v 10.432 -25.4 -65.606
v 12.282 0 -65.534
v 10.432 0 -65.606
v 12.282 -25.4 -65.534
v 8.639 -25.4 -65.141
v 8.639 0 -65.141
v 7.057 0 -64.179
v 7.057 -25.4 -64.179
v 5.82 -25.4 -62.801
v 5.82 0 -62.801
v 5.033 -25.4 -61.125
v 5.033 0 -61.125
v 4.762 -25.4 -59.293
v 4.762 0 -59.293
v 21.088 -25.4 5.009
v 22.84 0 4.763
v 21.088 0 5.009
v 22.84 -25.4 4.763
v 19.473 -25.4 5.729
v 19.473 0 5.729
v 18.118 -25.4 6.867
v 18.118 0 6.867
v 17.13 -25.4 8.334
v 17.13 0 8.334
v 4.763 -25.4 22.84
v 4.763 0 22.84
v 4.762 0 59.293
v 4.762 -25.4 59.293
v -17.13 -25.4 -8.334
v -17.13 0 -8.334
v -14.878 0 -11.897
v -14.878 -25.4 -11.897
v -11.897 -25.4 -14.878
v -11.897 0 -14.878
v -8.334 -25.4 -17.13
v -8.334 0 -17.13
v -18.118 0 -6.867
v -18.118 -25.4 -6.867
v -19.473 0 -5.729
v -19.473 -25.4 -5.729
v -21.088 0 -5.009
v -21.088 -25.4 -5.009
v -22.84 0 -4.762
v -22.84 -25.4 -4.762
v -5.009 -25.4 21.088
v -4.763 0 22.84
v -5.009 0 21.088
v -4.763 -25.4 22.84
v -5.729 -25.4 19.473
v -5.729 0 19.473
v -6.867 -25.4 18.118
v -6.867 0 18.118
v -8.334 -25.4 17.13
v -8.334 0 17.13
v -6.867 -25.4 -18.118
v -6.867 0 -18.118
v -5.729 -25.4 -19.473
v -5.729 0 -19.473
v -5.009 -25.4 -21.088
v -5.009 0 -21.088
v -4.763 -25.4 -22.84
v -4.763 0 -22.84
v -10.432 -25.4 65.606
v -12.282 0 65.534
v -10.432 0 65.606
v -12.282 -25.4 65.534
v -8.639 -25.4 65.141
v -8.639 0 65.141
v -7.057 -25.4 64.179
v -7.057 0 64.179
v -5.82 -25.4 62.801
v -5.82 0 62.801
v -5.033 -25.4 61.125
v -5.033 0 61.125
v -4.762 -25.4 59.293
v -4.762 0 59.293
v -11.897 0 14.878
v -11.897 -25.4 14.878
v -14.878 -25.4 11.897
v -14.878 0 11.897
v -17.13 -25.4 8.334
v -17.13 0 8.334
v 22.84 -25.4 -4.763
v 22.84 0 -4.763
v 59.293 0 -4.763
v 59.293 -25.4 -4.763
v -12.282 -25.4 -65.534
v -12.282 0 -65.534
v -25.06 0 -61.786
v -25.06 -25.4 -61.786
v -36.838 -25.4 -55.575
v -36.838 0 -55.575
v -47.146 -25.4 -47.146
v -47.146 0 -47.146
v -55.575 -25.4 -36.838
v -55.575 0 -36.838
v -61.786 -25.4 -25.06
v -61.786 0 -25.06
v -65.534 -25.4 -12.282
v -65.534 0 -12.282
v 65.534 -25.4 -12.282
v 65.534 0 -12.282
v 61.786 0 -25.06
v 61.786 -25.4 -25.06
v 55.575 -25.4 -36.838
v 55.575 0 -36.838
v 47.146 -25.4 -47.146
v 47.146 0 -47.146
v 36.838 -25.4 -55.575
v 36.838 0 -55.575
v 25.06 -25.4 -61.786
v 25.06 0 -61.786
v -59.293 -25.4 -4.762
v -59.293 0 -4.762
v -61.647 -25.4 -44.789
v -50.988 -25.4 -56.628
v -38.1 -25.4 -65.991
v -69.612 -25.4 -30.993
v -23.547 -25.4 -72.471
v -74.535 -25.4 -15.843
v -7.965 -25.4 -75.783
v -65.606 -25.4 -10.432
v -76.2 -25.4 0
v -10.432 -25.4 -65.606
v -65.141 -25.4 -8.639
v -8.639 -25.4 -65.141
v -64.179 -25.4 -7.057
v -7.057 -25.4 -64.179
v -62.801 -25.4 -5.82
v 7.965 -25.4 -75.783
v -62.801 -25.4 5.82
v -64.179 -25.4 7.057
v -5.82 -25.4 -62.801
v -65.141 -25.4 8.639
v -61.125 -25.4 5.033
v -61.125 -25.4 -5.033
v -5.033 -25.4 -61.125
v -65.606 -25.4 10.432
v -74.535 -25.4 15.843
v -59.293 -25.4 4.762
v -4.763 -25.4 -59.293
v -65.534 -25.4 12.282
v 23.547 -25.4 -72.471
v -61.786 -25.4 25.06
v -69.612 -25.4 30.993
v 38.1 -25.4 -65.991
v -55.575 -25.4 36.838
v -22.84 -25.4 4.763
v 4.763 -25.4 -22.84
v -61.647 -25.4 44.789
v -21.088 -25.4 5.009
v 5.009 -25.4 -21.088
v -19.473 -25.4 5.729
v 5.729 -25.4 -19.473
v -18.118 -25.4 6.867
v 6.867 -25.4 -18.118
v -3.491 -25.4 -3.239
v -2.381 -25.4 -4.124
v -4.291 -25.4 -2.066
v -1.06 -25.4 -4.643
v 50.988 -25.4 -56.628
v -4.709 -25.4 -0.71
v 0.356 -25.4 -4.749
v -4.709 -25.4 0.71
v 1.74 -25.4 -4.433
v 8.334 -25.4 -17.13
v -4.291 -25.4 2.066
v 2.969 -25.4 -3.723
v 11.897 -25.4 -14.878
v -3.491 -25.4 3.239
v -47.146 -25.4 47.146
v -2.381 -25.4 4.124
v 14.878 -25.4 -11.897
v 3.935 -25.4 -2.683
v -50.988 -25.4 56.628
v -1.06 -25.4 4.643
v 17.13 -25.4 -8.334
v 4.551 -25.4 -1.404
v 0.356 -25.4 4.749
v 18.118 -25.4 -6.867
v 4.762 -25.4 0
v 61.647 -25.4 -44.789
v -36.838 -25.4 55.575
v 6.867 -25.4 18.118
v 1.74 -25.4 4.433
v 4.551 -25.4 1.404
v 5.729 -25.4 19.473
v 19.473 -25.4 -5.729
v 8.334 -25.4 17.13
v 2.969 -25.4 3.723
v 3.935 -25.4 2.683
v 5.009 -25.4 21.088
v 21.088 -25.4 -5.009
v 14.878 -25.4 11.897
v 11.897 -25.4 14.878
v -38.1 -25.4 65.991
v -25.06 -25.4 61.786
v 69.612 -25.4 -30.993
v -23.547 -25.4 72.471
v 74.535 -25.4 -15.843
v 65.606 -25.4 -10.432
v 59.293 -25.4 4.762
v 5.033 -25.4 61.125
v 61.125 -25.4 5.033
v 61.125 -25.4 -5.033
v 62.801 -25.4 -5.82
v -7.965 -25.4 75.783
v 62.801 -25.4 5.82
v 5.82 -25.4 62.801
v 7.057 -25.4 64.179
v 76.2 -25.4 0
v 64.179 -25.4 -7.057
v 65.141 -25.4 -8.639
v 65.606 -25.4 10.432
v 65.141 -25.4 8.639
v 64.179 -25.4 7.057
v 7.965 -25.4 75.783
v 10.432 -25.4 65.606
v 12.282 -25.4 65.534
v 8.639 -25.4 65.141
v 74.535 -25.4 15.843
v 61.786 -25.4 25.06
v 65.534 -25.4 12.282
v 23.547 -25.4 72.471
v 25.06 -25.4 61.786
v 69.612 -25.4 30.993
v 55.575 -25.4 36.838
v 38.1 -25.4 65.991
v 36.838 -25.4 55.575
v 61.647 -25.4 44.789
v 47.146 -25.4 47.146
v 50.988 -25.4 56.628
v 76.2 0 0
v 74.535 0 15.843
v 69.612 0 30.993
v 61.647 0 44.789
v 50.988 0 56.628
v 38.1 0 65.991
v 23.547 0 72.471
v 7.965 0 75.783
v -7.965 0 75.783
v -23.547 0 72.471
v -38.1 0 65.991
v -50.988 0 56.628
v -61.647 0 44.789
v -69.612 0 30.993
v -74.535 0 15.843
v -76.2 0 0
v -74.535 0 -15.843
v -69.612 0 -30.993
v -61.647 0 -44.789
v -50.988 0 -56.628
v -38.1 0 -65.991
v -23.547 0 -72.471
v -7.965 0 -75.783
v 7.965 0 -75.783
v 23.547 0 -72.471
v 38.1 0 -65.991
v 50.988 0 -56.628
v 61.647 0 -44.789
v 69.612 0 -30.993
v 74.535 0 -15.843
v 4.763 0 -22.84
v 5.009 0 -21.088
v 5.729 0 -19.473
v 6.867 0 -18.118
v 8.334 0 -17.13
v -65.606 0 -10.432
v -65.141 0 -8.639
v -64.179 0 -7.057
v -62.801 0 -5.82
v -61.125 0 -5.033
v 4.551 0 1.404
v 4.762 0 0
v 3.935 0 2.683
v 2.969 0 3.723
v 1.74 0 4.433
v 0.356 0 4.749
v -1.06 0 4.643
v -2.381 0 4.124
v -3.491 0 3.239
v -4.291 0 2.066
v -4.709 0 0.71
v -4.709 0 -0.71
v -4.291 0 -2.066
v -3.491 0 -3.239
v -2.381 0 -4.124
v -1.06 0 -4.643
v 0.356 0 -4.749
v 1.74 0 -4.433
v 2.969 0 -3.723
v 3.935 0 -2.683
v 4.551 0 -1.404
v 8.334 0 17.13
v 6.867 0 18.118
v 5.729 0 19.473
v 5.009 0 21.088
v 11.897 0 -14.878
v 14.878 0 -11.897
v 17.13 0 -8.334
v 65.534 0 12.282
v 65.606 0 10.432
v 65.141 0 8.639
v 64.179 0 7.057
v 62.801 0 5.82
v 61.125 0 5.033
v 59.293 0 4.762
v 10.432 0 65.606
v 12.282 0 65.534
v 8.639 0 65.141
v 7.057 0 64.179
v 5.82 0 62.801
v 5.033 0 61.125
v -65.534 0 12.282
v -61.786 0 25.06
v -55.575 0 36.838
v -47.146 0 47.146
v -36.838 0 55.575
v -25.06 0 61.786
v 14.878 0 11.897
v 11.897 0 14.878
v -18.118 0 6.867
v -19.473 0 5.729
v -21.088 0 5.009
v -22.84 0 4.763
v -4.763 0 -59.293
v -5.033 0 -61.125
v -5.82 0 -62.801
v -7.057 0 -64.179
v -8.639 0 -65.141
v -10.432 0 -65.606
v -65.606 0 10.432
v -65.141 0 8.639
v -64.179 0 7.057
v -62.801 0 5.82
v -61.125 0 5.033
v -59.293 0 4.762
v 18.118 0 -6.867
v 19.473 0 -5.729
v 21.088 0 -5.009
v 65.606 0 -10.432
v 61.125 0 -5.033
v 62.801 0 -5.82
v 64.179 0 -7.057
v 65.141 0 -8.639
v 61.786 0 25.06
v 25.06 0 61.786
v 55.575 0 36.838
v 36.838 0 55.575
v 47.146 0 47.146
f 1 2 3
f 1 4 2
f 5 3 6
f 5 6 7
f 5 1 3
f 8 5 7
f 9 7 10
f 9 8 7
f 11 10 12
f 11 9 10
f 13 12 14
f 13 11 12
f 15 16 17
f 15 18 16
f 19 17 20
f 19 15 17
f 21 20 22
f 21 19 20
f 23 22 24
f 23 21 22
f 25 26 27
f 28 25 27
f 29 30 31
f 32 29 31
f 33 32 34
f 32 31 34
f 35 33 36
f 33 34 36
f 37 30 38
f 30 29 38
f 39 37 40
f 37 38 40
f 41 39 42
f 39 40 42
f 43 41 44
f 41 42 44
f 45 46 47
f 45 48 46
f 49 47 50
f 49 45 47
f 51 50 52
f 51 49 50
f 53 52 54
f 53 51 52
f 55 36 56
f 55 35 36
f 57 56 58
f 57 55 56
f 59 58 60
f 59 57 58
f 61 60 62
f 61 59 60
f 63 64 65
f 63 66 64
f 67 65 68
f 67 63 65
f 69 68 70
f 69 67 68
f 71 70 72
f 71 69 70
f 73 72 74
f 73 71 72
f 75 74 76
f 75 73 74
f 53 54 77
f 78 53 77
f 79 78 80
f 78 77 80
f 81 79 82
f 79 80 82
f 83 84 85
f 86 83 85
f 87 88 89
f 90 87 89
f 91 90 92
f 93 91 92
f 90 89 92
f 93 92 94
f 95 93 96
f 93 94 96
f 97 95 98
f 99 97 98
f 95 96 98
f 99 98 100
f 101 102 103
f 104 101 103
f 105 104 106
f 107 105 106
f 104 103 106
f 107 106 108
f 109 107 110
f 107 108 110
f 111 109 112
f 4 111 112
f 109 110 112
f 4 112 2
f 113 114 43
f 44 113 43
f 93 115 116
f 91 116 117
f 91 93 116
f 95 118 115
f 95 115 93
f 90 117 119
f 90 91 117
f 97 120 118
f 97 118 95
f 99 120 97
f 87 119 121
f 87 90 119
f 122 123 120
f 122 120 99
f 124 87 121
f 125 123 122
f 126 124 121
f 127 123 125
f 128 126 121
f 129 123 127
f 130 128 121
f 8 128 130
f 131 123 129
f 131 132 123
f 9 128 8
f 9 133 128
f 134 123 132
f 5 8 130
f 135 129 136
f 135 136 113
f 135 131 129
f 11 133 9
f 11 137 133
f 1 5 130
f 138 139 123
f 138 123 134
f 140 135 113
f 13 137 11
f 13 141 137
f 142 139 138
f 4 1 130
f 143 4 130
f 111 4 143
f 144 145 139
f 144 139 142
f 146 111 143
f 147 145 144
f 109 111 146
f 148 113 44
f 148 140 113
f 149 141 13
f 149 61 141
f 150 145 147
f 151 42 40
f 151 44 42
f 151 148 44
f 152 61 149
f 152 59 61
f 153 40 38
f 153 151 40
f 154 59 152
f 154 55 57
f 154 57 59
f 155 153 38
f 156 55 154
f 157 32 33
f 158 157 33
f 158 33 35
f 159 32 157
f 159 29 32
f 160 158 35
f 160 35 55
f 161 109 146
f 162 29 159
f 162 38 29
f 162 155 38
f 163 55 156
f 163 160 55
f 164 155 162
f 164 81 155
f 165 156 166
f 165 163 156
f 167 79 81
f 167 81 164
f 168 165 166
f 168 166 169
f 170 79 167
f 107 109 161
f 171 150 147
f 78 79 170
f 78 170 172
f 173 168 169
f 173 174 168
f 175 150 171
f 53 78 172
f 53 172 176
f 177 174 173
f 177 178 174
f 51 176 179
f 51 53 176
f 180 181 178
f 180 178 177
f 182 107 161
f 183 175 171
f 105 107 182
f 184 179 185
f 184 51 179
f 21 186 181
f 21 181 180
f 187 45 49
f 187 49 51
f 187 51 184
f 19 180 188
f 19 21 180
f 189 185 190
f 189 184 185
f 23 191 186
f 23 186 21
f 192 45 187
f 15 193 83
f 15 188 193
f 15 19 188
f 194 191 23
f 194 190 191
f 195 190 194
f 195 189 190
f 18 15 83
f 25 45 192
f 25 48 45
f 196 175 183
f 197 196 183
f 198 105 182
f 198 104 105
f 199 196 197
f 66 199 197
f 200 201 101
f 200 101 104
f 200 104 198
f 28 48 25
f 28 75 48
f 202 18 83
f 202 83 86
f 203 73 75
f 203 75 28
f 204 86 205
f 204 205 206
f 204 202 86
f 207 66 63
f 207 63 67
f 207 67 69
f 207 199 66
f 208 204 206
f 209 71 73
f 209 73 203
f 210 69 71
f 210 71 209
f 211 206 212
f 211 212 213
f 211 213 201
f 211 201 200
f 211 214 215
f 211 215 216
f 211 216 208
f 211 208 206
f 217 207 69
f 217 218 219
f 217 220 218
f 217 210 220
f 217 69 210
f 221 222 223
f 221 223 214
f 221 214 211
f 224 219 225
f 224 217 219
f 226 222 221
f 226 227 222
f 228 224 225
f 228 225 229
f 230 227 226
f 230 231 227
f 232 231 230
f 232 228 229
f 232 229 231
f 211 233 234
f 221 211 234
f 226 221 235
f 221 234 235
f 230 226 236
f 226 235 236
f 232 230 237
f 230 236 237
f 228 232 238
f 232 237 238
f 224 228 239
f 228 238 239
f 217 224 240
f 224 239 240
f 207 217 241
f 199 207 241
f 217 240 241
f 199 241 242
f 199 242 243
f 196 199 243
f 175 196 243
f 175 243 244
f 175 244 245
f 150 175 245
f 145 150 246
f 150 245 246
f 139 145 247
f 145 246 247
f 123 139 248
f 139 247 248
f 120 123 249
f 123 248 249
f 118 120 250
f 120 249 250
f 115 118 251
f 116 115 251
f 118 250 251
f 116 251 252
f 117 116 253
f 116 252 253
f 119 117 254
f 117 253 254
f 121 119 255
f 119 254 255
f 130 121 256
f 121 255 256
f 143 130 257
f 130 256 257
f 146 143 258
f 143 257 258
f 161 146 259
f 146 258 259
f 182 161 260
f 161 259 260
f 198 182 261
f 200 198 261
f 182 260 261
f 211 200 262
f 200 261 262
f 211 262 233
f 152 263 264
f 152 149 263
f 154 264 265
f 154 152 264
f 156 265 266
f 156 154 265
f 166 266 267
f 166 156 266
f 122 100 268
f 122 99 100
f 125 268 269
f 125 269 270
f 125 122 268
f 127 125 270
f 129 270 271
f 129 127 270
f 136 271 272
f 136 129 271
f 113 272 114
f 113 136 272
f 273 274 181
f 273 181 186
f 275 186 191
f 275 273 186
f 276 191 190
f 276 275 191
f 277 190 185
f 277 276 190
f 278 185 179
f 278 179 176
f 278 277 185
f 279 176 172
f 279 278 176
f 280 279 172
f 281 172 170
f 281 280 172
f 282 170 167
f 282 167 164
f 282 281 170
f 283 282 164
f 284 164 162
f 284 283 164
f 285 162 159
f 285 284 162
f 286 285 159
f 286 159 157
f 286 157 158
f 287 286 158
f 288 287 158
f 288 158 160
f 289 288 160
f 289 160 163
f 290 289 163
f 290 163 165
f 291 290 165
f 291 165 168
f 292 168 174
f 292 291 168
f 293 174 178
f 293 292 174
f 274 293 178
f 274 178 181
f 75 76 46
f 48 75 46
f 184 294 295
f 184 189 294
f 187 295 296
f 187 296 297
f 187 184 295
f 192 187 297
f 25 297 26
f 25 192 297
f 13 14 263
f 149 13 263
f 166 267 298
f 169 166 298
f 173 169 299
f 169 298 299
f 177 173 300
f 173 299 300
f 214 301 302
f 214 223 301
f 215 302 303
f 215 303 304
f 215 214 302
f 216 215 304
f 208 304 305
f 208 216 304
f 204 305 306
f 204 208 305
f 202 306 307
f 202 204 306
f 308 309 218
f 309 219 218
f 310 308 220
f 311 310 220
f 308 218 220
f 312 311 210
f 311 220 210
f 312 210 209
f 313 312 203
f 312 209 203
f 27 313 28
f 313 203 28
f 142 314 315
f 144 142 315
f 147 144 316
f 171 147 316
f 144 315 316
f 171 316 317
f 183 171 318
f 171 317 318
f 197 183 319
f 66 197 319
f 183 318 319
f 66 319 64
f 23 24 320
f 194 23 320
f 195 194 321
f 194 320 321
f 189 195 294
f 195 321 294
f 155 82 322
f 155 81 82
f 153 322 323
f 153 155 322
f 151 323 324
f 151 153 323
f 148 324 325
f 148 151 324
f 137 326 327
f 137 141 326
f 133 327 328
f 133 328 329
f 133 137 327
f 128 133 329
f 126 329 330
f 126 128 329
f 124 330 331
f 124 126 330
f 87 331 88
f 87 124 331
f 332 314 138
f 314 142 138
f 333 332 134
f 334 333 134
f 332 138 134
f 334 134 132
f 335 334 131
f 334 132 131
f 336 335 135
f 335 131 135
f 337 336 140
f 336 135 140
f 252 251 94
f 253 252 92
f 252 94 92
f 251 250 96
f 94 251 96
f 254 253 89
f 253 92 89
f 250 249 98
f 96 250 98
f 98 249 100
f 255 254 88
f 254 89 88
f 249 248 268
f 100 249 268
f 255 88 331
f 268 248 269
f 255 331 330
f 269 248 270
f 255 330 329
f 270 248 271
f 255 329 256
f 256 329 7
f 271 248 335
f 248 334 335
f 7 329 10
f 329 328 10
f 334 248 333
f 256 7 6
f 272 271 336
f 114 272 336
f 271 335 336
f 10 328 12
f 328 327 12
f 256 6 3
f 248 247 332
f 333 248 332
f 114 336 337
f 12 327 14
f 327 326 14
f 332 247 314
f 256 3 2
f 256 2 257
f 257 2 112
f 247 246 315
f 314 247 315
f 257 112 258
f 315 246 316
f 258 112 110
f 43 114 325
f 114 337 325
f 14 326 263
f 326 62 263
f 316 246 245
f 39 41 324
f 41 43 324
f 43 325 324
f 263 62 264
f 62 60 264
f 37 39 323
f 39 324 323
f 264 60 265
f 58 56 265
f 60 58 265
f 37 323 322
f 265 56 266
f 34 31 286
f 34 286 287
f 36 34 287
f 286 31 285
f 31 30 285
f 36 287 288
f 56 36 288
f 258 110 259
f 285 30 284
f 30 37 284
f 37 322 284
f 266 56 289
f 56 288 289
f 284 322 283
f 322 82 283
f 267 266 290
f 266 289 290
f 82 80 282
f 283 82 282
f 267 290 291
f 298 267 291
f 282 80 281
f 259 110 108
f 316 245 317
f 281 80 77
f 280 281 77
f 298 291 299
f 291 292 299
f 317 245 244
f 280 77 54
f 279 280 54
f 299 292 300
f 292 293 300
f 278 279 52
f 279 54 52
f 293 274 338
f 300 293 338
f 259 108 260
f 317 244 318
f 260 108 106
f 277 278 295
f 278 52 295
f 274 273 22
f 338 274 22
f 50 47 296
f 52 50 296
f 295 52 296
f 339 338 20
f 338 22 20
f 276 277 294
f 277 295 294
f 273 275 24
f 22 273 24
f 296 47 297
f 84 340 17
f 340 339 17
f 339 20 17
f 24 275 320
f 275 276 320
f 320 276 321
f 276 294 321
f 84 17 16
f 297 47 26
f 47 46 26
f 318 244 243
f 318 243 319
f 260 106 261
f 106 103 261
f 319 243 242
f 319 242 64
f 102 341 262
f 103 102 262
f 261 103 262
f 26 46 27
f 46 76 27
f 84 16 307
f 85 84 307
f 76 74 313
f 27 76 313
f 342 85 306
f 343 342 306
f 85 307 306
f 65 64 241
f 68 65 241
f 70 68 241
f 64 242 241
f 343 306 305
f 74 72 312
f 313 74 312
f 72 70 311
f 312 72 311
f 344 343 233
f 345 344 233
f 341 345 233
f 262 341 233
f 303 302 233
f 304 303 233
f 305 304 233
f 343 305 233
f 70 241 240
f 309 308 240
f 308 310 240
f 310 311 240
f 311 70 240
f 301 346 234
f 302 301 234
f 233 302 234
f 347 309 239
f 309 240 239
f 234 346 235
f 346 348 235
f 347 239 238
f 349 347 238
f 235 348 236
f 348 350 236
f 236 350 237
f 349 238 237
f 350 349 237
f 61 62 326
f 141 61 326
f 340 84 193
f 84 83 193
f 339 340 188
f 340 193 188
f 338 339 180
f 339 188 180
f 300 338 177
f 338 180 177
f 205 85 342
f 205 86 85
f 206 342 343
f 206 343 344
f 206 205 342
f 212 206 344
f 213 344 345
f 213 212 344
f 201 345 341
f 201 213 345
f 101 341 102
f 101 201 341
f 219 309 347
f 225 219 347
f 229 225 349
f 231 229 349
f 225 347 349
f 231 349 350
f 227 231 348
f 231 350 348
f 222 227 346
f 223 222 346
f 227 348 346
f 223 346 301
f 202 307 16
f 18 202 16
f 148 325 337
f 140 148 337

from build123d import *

# Parameters (mm, degrees)
F0_R     = 76.2
F0_R_2   = 4.7625
F1_DEPTH = 25.4
F2_R     = 6.35


with BuildPart() as f1:
    # F0 (on Front) → F1 (new body)
    with BuildSketch(Plane.XZ):
        Circle(F0_R)
        with BuildLine():
            ThreePointArc((66.504693, 4.7625), (66.63241, 2.382772), (66.675, 0))
            ThreePointArc((66.675, 0), (66.63241, -2.382772), (66.504693, -4.7625))
            ThreePointArc((66.504693, -4.7625), (47.146345, -47.146345), (4.7625, -66.504693))
            ThreePointArc((4.7625, -66.504693), (0, -66.675), (-4.7625, -66.504693))
            ThreePointArc((-4.7625, -66.504693), (-47.146345, -47.146345), (-66.504693, -4.7625))
            ThreePointArc((-66.504693, -4.7625), (-66.675, 0), (-66.504693, 4.7625))
            ThreePointArc((-66.504693, 4.7625), (-47.146345, 47.146345), (-4.7625, 66.504693))
            ThreePointArc((-4.7625, 66.504693), (0, 66.675), (4.7625, 66.504693))
            ThreePointArc((4.7625, 66.504693), (47.146345, 47.146345), (66.504693, 4.7625))
        make_face(mode=Mode.SUBTRACT)
        with BuildLine():
            Line((4.7625, 18.445083), (4.7625, 66.504693))
            ThreePointArc((4.7625, 66.504693), (0, 66.675), (-4.7625, 66.504693))
            Line((-4.7625, 66.504693), (-4.7625, 18.445083))
            ThreePointArc((-4.7625, 18.445083), (0, 19.05), (4.7625, 18.445083))
        make_face()
        with BuildLine():
            ThreePointArc((66.504693, -4.7625), (66.63241, -2.382772), (66.675, 0))
            ThreePointArc((66.675, 0), (66.63241, 2.382772), (66.504693, 4.7625))
            Line((66.504693, 4.7625), (18.445083, 4.7625))
            ThreePointArc((18.445083, 4.7625), (18.898166, 2.400382), (19.05, 0))
            ThreePointArc((19.05, 0), (18.898166, -2.400382), (18.445083, -4.7625))
            Line((18.445083, -4.7625), (66.504693, -4.7625))
        make_face()
        with BuildLine():
            ThreePointArc((19.05, 0), (18.898166, 2.400382), (18.445083, 4.7625))
            ThreePointArc((18.445083, 4.7625), (13.470384, 13.470384), (4.7625, 18.445083))
            ThreePointArc((4.7625, 18.445083), (0, 19.05), (-4.7625, 18.445083))
            ThreePointArc((-4.7625, 18.445083), (-13.470384, 13.470384), (-18.445083, 4.7625))
            ThreePointArc((-18.445083, 4.7625), (-19.05, 0), (-18.445083, -4.7625))
            ThreePointArc((-18.445083, -4.7625), (-13.470384, -13.470384), (-4.7625, -18.445083))
            ThreePointArc((-4.7625, -18.445083), (0, -19.05), (4.7625, -18.445083))
            ThreePointArc((4.7625, -18.445083), (13.470384, -13.470384), (18.445083, -4.7625))
            ThreePointArc((18.445083, -4.7625), (18.898166, -2.400382), (19.05, 0))
        make_face()
        Circle(F0_R_2, mode=Mode.SUBTRACT)
        with BuildLine():
            ThreePointArc((-4.7625, -66.504693), (0, -66.675), (4.7625, -66.504693))
            Line((4.7625, -66.504693), (4.7625, -18.445083))
            ThreePointArc((4.7625, -18.445083), (0, -19.05), (-4.7625, -18.445083))
            Line((-4.7625, -18.445083), (-4.7625, -66.504693))
        make_face()
        with BuildLine():
            Line((-18.445083, 4.7625), (-66.504693, 4.7625))
            ThreePointArc((-66.504693, 4.7625), (-66.675, 0), (-66.504693, -4.7625))
            Line((-66.504693, -4.7625), (-18.445083, -4.7625))
            ThreePointArc((-18.445083, -4.7625), (-19.05, 0), (-18.445083, 4.7625))
        make_face()
    extrude(amount=F1_DEPTH)

    # F2
    f2_edges = [f1.edges().sort_by_distance(p)[0] for p in [
        (4.7625, -12.7, 18.445083),
        (18.445083, -12.7, 4.7625),
        (-66.504693, -12.7, 4.7625),
        (4.7625, -12.7, -66.504693),
        (-18.445083, -12.7, 4.7625),
        (-4.7625, -12.7, 18.445083),
        (-4.7625, -12.7, -66.504693),
        (66.504693, -12.7, 4.7625),
        (18.445083, -12.7, -4.7625),
        (4.7625, -12.7, -18.445083),
        (4.7625, -12.7, 66.504693),
        (-66.504693, -12.7, -4.7625),
        (-4.7625, -12.7, -18.445083),
        (-18.445083, -12.7, -4.7625),
        (-4.7625, -12.7, 66.504693),
        (66.504693, -12.7, -4.7625),
    ]]
    fillet(f2_edges, radius=F2_R)


solid = f1.part
